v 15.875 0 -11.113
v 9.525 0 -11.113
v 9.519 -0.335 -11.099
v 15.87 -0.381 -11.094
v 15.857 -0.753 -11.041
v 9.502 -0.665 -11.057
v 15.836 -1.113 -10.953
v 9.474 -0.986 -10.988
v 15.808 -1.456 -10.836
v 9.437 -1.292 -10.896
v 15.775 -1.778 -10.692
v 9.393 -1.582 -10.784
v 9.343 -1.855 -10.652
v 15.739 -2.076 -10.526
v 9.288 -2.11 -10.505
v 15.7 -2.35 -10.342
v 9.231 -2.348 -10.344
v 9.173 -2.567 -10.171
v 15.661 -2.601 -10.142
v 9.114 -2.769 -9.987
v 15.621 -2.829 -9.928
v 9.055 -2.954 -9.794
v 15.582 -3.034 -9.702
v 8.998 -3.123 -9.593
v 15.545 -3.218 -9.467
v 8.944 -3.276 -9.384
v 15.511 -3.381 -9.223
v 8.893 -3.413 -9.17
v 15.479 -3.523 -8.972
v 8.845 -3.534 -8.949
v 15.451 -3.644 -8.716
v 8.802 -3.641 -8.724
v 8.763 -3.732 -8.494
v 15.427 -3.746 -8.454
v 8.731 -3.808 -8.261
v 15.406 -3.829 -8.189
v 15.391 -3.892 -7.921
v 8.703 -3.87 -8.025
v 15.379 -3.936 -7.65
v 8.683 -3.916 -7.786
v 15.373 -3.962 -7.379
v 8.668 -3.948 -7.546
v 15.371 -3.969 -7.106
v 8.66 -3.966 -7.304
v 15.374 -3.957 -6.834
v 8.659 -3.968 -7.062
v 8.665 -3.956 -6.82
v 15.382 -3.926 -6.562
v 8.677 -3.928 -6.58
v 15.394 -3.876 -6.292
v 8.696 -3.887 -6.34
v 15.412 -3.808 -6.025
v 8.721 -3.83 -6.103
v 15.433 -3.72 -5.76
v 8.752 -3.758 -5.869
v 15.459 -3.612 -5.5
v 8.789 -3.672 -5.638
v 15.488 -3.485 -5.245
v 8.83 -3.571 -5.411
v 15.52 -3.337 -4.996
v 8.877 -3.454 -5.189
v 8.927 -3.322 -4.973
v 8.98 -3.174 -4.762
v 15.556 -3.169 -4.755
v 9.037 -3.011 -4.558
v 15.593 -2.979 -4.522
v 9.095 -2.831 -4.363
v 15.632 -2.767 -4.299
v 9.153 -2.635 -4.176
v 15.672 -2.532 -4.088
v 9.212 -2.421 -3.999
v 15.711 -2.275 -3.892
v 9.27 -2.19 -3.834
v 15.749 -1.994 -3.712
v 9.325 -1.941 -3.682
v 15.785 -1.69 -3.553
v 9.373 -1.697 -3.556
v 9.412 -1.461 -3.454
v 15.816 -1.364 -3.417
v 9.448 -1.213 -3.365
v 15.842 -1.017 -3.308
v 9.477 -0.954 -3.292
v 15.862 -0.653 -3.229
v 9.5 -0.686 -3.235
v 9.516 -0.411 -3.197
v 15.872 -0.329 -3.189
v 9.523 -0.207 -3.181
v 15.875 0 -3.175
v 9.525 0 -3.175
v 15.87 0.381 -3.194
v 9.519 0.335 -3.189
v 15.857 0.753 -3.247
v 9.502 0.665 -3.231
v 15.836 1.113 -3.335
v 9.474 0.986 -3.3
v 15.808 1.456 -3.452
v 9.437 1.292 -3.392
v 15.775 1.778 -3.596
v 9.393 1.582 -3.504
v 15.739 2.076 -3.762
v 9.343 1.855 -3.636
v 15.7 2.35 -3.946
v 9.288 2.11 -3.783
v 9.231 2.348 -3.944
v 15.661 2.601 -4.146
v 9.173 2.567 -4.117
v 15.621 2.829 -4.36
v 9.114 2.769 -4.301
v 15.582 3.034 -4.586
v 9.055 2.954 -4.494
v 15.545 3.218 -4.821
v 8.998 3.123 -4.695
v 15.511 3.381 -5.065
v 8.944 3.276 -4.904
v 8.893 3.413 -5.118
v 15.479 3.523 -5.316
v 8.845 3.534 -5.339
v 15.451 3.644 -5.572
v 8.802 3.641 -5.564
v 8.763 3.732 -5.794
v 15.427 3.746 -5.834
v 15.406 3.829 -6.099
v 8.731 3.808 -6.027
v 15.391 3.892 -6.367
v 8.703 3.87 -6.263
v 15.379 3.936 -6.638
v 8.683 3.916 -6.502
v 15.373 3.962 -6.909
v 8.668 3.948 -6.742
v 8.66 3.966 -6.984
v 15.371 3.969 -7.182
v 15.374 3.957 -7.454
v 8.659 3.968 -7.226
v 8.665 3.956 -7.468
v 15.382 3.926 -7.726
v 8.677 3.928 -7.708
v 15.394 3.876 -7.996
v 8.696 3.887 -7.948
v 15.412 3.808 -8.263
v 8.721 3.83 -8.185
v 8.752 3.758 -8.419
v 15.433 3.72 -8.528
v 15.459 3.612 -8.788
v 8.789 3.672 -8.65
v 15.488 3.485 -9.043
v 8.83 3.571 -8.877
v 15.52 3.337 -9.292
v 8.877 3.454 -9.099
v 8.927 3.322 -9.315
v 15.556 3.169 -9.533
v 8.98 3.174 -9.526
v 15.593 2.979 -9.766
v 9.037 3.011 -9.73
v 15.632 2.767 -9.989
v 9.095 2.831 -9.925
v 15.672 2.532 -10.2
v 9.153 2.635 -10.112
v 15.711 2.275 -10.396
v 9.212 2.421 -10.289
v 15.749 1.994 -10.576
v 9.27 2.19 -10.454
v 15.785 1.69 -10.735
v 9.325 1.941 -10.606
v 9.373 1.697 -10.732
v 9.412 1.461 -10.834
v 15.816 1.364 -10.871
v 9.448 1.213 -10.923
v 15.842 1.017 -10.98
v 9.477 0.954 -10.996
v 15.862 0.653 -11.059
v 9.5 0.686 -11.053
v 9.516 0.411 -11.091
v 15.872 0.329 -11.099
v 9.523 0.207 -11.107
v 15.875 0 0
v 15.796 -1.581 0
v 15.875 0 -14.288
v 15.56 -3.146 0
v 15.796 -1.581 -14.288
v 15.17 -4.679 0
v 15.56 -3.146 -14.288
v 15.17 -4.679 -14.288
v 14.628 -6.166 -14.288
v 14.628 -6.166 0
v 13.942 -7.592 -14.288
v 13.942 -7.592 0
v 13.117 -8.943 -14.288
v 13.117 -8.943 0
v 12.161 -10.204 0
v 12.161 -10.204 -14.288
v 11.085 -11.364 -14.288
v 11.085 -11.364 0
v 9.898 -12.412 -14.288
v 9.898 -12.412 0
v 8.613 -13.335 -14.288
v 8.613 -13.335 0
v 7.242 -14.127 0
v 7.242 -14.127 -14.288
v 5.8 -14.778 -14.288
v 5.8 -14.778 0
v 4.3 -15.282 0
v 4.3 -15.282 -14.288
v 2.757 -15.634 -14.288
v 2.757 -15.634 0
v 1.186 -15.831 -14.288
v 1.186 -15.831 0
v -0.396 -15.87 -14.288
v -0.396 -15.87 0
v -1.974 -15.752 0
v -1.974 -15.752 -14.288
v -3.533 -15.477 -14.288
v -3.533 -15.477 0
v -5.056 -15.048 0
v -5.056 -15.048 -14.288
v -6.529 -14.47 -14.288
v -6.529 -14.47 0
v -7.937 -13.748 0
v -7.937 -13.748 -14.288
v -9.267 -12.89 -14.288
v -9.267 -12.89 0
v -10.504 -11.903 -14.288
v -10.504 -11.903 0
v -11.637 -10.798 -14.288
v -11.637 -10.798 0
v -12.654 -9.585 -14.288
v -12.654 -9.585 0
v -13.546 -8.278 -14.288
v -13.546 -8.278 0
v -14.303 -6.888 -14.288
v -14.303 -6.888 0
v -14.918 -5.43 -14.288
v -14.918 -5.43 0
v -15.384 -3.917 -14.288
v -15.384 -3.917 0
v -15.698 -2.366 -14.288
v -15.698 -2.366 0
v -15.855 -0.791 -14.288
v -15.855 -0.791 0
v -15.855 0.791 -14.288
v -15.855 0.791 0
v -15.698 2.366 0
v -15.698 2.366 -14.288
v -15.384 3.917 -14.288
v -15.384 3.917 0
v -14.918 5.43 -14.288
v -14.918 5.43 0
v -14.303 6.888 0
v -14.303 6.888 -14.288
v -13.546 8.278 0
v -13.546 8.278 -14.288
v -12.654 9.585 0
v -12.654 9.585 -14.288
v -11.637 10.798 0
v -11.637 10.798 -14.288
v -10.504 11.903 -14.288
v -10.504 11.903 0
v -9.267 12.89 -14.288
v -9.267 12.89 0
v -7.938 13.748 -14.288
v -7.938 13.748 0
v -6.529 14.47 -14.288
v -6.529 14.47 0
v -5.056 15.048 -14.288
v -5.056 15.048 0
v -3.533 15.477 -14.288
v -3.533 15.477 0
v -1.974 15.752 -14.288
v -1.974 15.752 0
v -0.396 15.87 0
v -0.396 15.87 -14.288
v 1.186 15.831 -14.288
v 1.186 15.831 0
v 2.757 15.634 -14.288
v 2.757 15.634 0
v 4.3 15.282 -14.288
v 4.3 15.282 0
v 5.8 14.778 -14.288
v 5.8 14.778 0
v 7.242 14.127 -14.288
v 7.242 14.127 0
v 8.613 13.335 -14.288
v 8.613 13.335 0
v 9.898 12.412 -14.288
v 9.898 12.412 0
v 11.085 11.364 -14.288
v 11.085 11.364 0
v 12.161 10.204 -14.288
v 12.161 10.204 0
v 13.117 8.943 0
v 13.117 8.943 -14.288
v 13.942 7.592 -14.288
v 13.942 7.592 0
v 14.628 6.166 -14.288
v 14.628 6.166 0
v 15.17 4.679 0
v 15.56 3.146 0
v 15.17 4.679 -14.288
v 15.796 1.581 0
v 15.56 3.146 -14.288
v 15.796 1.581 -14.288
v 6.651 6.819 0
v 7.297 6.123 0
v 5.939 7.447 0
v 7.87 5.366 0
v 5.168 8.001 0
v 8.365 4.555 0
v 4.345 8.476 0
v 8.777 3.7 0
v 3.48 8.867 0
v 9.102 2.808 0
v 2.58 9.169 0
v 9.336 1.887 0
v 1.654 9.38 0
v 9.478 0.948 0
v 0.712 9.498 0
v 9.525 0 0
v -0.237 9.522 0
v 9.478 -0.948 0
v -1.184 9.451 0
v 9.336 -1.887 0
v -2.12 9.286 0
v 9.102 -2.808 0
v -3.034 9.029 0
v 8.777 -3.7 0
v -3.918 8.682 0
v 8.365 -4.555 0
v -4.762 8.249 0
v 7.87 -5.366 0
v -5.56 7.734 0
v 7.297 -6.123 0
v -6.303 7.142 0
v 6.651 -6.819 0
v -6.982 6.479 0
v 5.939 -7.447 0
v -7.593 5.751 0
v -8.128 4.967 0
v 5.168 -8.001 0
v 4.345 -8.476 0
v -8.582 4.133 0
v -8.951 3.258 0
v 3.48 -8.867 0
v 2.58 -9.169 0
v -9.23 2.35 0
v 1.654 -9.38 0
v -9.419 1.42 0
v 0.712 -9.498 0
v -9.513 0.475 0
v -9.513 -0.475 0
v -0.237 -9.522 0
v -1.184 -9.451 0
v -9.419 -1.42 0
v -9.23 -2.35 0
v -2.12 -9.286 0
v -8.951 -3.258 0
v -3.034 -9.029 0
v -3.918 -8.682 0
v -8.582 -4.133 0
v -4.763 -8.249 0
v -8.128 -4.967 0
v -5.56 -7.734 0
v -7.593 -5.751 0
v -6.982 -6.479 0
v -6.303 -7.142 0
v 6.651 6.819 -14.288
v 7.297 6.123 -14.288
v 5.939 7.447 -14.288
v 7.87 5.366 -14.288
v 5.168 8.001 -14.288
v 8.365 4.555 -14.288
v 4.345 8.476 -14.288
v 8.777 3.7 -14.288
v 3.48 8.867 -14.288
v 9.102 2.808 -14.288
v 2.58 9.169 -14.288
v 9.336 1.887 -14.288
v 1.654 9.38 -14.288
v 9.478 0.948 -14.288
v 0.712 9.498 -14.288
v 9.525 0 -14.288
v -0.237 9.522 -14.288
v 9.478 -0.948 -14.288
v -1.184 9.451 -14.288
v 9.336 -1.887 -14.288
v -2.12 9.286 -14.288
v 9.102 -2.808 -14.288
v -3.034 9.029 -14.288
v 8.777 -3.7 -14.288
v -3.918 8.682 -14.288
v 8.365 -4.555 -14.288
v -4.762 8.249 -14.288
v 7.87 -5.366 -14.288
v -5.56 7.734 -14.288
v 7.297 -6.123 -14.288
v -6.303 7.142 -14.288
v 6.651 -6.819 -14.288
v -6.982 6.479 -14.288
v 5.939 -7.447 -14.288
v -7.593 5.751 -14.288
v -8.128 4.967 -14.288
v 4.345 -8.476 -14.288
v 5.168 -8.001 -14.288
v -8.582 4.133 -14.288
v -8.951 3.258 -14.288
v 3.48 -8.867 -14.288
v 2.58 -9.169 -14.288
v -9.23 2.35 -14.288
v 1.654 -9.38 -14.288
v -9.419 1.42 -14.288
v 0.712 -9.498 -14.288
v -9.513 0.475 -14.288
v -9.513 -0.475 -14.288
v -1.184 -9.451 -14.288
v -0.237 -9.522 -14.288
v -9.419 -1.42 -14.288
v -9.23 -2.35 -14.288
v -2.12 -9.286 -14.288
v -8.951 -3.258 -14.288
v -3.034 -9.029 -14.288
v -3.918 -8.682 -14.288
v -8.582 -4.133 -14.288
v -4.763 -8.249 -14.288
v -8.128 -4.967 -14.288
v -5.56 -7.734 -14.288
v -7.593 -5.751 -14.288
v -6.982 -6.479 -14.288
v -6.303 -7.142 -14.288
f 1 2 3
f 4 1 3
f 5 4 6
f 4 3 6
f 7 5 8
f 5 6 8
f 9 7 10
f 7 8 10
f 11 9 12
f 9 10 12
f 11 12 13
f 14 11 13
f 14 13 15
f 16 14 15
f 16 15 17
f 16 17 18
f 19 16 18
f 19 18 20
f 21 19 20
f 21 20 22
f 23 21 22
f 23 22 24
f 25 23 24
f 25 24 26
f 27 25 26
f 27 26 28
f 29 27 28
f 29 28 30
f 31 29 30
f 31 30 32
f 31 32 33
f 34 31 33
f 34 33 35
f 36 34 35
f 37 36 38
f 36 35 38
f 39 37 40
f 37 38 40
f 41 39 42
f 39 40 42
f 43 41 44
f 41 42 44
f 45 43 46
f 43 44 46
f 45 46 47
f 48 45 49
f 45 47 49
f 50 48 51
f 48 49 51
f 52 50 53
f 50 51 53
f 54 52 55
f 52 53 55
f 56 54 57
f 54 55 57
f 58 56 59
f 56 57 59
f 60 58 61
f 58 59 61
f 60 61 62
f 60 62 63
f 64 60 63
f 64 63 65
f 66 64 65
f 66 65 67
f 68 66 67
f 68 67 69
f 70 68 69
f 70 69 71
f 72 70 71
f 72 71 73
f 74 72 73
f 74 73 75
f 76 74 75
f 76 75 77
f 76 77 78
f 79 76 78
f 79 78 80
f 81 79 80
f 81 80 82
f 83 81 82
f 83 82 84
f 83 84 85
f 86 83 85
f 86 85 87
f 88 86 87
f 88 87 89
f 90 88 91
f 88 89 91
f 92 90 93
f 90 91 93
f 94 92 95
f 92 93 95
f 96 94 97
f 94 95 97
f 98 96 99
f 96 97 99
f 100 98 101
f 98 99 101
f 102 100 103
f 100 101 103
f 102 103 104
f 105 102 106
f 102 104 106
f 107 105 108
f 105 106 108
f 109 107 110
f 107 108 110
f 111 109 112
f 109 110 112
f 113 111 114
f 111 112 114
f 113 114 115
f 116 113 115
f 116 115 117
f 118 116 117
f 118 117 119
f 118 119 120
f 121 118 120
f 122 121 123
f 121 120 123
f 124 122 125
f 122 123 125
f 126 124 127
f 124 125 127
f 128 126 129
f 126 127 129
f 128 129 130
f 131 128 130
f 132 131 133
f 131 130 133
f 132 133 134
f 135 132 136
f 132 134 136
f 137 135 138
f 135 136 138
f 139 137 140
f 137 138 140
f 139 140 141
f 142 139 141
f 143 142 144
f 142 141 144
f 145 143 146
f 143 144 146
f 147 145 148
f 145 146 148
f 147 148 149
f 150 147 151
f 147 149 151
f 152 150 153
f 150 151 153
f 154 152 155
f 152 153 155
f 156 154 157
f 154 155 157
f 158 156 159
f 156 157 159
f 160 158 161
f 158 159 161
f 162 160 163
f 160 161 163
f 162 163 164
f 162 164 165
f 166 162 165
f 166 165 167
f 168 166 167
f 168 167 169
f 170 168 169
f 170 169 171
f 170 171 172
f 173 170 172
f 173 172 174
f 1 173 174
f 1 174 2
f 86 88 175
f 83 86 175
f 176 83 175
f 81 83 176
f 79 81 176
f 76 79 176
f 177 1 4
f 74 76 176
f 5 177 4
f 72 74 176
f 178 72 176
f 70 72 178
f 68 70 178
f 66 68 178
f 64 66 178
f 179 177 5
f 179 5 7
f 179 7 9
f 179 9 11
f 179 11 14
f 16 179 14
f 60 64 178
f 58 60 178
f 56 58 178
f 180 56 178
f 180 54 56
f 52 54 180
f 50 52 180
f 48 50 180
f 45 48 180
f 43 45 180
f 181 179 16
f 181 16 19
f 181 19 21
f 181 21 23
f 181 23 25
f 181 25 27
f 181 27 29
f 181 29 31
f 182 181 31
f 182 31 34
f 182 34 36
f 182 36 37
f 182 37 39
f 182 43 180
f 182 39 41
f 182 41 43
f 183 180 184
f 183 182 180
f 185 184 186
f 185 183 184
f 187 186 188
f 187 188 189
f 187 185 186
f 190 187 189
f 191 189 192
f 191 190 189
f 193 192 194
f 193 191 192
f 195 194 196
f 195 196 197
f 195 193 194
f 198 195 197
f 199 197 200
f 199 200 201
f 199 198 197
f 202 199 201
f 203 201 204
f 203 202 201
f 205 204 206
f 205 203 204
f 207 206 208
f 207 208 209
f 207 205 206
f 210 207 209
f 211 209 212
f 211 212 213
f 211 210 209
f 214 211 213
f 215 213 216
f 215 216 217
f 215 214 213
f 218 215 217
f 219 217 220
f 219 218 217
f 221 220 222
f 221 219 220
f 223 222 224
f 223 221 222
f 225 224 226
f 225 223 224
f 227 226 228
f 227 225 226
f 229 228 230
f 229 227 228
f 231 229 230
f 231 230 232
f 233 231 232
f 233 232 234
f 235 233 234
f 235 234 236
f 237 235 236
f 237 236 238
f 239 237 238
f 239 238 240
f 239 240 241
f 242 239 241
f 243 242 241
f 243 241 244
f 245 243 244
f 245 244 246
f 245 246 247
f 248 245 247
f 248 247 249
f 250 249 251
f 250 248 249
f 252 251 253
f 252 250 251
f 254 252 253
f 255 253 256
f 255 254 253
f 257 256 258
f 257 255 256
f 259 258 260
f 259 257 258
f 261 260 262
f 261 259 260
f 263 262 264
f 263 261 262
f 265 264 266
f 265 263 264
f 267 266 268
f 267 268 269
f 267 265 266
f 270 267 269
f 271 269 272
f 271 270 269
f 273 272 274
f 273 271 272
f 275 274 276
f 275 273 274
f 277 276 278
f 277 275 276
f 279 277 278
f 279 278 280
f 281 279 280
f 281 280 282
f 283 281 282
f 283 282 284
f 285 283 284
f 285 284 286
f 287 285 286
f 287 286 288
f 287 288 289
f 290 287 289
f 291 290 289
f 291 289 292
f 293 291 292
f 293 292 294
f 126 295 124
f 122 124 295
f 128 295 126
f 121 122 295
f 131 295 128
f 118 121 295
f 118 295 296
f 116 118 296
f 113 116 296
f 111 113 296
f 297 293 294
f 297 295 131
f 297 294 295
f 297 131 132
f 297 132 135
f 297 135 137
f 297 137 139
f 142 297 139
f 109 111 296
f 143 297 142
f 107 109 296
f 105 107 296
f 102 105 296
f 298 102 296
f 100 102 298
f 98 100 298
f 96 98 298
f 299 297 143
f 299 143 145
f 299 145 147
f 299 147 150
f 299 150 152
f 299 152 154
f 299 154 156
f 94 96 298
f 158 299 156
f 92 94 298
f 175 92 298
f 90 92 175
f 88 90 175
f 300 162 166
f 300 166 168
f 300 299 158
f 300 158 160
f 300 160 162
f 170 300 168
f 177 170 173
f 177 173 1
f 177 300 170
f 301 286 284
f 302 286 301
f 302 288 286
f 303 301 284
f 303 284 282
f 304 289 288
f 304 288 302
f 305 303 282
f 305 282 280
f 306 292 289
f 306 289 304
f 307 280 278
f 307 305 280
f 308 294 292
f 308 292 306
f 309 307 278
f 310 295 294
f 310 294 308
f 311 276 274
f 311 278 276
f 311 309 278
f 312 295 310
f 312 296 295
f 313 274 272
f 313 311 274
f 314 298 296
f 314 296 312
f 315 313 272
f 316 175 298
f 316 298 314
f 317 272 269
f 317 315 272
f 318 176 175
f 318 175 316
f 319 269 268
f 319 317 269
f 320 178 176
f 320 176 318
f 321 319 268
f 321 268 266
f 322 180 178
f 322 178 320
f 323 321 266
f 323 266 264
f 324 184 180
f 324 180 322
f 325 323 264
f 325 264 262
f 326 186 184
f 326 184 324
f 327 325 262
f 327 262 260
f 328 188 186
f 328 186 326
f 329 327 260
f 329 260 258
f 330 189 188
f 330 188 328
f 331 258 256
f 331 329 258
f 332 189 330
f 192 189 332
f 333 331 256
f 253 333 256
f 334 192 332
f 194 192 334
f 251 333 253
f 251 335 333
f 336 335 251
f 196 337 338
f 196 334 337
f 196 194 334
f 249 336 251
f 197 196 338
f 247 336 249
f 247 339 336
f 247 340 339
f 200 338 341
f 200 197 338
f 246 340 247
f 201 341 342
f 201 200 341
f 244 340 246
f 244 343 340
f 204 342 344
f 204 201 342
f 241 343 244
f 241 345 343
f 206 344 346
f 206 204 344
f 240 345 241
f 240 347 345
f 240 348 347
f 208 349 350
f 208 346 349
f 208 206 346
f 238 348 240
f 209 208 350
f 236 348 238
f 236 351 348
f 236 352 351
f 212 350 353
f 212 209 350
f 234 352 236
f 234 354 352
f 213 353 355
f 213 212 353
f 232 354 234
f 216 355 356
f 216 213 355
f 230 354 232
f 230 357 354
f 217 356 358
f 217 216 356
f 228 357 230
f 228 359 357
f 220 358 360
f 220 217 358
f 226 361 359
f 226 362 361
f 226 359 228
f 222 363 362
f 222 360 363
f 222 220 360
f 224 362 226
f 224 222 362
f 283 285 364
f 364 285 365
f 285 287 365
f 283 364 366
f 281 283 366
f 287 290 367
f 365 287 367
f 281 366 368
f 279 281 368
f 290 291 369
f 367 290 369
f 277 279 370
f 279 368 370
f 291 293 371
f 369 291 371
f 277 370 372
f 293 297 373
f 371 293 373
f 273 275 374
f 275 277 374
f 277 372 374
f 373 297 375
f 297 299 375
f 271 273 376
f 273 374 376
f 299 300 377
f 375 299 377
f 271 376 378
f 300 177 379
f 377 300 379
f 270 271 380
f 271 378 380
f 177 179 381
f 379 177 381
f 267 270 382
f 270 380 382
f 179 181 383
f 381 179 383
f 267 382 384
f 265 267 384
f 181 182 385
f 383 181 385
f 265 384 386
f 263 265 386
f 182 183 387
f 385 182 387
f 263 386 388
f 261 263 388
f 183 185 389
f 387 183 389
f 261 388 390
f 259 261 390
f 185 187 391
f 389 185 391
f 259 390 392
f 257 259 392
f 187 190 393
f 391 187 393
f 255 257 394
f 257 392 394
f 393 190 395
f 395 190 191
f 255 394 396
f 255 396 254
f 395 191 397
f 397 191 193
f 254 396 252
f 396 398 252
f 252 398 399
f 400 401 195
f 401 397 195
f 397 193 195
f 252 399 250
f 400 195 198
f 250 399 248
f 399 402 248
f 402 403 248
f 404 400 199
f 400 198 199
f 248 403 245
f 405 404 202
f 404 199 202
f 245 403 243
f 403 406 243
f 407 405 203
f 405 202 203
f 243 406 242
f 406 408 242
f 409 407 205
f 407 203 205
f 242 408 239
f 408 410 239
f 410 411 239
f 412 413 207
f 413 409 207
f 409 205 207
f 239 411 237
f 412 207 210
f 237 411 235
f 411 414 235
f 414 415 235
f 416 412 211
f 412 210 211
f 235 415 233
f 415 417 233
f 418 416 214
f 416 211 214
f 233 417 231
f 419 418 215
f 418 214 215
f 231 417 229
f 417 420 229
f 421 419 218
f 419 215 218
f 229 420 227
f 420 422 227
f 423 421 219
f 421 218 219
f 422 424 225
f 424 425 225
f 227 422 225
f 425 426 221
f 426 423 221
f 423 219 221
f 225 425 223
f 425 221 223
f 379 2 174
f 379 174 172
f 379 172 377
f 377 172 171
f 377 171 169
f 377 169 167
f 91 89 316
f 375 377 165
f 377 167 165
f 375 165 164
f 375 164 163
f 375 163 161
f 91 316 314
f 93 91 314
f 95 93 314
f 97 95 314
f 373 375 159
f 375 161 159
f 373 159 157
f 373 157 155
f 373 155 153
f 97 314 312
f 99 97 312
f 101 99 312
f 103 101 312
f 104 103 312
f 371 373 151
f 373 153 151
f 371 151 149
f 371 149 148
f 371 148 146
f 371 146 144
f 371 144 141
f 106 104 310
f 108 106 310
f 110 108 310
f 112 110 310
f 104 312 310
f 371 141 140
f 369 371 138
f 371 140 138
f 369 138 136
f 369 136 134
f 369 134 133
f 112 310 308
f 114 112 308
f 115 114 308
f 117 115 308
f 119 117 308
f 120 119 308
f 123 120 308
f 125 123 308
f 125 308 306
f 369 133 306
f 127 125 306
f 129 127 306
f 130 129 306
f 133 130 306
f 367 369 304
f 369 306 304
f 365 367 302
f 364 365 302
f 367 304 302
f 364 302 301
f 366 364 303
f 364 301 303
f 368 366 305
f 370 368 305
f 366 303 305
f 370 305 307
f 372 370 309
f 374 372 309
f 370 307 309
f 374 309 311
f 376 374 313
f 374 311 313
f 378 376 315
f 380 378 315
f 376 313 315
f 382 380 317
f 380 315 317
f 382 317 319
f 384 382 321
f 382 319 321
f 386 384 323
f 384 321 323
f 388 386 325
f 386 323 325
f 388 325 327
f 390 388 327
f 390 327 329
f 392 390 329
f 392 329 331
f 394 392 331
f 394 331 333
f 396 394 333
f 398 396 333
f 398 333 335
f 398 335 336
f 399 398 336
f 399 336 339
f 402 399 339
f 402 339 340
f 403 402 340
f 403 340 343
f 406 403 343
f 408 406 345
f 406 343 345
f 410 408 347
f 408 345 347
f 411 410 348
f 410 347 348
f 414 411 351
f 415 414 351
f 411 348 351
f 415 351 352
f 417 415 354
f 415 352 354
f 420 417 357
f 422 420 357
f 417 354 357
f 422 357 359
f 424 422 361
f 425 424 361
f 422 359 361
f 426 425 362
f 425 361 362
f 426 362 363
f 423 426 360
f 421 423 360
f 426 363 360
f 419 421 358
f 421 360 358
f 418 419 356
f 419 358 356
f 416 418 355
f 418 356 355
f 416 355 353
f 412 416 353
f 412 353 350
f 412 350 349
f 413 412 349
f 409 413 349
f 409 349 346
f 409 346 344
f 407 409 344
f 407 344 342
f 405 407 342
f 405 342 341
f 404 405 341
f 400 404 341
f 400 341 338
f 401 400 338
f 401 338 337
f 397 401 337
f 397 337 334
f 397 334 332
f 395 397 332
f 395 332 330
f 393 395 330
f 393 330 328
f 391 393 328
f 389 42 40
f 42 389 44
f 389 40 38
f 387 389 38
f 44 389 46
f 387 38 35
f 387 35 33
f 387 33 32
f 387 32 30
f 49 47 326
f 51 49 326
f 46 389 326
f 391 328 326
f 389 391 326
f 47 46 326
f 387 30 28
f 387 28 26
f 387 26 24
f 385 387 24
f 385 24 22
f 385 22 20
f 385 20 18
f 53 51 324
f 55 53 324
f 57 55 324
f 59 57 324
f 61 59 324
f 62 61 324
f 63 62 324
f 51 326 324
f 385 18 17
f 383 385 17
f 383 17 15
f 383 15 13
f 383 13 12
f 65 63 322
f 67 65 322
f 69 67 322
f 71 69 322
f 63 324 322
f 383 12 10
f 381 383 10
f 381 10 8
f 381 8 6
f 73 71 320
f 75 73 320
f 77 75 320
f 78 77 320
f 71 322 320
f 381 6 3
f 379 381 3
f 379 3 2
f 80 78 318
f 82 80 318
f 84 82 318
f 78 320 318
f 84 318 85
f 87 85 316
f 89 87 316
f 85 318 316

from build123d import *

# Parameters (mm, degrees)
CROQUIS1_W            = 14.288
CROQUIS1_H            = 15.875
CORTAR_EXTRUIR1_REACH = 28.612
CROQUIS2_R            = 9.525
CROQUIS3_W            = 3.96875
CROQUIS3_H            = 15.875


with BuildPart() as part:
    # Croquis1 → Revolución1 (revolve)
    with BuildSketch(Plane(origin=(0, 0, 0), x_dir=(0, 0, -1), z_dir=(1, 0, 0)), mode=Mode.PRIVATE) as revoluci_n1_sk:
        with Locations((7.144, 7.9375)):
            Rectangle(CROQUIS1_W, CROQUIS1_H)
    revolve(revoluci_n1_sk.sketch.rotate(Axis((0, 0, 0), (0, 0, -1)), 90), axis=Axis((0, 0, 0), (0, 0, -1)))

    # Croquis2 → Cortar-Extruir1 (cut, up to next)
    with BuildSketch(Plane.XY, mode=Mode.PRIVATE) as cortar_extruir1_sk1:
        Circle(CROQUIS2_R)
    cortar_extruir1_tool1 = extrude(cortar_extruir1_sk1.sketch, amount=-CORTAR_EXTRUIR1_REACH, mode=Mode.PRIVATE) & part.part
    add(cortar_extruir1_tool1.solids().sort_by_distance((0, 0, 0))[0], mode=Mode.SUBTRACT)

    # Croquis3 → Taladro roscado 1/8-27 NPSM1 (revolve, cut)
    with BuildSketch(Plane(origin=(15.875, 0, -7.144), x_dir=(0, 0, -1), z_dir=(0, 1, 0))):
        with Locations((1.984375, 7.9375)):
            Rectangle(CROQUIS3_W, CROQUIS3_H)
    revolve(axis=Axis((22.225, 0, -7.144), (-1, 0, 0)), mode=Mode.SUBTRACT)


solid = part.part
